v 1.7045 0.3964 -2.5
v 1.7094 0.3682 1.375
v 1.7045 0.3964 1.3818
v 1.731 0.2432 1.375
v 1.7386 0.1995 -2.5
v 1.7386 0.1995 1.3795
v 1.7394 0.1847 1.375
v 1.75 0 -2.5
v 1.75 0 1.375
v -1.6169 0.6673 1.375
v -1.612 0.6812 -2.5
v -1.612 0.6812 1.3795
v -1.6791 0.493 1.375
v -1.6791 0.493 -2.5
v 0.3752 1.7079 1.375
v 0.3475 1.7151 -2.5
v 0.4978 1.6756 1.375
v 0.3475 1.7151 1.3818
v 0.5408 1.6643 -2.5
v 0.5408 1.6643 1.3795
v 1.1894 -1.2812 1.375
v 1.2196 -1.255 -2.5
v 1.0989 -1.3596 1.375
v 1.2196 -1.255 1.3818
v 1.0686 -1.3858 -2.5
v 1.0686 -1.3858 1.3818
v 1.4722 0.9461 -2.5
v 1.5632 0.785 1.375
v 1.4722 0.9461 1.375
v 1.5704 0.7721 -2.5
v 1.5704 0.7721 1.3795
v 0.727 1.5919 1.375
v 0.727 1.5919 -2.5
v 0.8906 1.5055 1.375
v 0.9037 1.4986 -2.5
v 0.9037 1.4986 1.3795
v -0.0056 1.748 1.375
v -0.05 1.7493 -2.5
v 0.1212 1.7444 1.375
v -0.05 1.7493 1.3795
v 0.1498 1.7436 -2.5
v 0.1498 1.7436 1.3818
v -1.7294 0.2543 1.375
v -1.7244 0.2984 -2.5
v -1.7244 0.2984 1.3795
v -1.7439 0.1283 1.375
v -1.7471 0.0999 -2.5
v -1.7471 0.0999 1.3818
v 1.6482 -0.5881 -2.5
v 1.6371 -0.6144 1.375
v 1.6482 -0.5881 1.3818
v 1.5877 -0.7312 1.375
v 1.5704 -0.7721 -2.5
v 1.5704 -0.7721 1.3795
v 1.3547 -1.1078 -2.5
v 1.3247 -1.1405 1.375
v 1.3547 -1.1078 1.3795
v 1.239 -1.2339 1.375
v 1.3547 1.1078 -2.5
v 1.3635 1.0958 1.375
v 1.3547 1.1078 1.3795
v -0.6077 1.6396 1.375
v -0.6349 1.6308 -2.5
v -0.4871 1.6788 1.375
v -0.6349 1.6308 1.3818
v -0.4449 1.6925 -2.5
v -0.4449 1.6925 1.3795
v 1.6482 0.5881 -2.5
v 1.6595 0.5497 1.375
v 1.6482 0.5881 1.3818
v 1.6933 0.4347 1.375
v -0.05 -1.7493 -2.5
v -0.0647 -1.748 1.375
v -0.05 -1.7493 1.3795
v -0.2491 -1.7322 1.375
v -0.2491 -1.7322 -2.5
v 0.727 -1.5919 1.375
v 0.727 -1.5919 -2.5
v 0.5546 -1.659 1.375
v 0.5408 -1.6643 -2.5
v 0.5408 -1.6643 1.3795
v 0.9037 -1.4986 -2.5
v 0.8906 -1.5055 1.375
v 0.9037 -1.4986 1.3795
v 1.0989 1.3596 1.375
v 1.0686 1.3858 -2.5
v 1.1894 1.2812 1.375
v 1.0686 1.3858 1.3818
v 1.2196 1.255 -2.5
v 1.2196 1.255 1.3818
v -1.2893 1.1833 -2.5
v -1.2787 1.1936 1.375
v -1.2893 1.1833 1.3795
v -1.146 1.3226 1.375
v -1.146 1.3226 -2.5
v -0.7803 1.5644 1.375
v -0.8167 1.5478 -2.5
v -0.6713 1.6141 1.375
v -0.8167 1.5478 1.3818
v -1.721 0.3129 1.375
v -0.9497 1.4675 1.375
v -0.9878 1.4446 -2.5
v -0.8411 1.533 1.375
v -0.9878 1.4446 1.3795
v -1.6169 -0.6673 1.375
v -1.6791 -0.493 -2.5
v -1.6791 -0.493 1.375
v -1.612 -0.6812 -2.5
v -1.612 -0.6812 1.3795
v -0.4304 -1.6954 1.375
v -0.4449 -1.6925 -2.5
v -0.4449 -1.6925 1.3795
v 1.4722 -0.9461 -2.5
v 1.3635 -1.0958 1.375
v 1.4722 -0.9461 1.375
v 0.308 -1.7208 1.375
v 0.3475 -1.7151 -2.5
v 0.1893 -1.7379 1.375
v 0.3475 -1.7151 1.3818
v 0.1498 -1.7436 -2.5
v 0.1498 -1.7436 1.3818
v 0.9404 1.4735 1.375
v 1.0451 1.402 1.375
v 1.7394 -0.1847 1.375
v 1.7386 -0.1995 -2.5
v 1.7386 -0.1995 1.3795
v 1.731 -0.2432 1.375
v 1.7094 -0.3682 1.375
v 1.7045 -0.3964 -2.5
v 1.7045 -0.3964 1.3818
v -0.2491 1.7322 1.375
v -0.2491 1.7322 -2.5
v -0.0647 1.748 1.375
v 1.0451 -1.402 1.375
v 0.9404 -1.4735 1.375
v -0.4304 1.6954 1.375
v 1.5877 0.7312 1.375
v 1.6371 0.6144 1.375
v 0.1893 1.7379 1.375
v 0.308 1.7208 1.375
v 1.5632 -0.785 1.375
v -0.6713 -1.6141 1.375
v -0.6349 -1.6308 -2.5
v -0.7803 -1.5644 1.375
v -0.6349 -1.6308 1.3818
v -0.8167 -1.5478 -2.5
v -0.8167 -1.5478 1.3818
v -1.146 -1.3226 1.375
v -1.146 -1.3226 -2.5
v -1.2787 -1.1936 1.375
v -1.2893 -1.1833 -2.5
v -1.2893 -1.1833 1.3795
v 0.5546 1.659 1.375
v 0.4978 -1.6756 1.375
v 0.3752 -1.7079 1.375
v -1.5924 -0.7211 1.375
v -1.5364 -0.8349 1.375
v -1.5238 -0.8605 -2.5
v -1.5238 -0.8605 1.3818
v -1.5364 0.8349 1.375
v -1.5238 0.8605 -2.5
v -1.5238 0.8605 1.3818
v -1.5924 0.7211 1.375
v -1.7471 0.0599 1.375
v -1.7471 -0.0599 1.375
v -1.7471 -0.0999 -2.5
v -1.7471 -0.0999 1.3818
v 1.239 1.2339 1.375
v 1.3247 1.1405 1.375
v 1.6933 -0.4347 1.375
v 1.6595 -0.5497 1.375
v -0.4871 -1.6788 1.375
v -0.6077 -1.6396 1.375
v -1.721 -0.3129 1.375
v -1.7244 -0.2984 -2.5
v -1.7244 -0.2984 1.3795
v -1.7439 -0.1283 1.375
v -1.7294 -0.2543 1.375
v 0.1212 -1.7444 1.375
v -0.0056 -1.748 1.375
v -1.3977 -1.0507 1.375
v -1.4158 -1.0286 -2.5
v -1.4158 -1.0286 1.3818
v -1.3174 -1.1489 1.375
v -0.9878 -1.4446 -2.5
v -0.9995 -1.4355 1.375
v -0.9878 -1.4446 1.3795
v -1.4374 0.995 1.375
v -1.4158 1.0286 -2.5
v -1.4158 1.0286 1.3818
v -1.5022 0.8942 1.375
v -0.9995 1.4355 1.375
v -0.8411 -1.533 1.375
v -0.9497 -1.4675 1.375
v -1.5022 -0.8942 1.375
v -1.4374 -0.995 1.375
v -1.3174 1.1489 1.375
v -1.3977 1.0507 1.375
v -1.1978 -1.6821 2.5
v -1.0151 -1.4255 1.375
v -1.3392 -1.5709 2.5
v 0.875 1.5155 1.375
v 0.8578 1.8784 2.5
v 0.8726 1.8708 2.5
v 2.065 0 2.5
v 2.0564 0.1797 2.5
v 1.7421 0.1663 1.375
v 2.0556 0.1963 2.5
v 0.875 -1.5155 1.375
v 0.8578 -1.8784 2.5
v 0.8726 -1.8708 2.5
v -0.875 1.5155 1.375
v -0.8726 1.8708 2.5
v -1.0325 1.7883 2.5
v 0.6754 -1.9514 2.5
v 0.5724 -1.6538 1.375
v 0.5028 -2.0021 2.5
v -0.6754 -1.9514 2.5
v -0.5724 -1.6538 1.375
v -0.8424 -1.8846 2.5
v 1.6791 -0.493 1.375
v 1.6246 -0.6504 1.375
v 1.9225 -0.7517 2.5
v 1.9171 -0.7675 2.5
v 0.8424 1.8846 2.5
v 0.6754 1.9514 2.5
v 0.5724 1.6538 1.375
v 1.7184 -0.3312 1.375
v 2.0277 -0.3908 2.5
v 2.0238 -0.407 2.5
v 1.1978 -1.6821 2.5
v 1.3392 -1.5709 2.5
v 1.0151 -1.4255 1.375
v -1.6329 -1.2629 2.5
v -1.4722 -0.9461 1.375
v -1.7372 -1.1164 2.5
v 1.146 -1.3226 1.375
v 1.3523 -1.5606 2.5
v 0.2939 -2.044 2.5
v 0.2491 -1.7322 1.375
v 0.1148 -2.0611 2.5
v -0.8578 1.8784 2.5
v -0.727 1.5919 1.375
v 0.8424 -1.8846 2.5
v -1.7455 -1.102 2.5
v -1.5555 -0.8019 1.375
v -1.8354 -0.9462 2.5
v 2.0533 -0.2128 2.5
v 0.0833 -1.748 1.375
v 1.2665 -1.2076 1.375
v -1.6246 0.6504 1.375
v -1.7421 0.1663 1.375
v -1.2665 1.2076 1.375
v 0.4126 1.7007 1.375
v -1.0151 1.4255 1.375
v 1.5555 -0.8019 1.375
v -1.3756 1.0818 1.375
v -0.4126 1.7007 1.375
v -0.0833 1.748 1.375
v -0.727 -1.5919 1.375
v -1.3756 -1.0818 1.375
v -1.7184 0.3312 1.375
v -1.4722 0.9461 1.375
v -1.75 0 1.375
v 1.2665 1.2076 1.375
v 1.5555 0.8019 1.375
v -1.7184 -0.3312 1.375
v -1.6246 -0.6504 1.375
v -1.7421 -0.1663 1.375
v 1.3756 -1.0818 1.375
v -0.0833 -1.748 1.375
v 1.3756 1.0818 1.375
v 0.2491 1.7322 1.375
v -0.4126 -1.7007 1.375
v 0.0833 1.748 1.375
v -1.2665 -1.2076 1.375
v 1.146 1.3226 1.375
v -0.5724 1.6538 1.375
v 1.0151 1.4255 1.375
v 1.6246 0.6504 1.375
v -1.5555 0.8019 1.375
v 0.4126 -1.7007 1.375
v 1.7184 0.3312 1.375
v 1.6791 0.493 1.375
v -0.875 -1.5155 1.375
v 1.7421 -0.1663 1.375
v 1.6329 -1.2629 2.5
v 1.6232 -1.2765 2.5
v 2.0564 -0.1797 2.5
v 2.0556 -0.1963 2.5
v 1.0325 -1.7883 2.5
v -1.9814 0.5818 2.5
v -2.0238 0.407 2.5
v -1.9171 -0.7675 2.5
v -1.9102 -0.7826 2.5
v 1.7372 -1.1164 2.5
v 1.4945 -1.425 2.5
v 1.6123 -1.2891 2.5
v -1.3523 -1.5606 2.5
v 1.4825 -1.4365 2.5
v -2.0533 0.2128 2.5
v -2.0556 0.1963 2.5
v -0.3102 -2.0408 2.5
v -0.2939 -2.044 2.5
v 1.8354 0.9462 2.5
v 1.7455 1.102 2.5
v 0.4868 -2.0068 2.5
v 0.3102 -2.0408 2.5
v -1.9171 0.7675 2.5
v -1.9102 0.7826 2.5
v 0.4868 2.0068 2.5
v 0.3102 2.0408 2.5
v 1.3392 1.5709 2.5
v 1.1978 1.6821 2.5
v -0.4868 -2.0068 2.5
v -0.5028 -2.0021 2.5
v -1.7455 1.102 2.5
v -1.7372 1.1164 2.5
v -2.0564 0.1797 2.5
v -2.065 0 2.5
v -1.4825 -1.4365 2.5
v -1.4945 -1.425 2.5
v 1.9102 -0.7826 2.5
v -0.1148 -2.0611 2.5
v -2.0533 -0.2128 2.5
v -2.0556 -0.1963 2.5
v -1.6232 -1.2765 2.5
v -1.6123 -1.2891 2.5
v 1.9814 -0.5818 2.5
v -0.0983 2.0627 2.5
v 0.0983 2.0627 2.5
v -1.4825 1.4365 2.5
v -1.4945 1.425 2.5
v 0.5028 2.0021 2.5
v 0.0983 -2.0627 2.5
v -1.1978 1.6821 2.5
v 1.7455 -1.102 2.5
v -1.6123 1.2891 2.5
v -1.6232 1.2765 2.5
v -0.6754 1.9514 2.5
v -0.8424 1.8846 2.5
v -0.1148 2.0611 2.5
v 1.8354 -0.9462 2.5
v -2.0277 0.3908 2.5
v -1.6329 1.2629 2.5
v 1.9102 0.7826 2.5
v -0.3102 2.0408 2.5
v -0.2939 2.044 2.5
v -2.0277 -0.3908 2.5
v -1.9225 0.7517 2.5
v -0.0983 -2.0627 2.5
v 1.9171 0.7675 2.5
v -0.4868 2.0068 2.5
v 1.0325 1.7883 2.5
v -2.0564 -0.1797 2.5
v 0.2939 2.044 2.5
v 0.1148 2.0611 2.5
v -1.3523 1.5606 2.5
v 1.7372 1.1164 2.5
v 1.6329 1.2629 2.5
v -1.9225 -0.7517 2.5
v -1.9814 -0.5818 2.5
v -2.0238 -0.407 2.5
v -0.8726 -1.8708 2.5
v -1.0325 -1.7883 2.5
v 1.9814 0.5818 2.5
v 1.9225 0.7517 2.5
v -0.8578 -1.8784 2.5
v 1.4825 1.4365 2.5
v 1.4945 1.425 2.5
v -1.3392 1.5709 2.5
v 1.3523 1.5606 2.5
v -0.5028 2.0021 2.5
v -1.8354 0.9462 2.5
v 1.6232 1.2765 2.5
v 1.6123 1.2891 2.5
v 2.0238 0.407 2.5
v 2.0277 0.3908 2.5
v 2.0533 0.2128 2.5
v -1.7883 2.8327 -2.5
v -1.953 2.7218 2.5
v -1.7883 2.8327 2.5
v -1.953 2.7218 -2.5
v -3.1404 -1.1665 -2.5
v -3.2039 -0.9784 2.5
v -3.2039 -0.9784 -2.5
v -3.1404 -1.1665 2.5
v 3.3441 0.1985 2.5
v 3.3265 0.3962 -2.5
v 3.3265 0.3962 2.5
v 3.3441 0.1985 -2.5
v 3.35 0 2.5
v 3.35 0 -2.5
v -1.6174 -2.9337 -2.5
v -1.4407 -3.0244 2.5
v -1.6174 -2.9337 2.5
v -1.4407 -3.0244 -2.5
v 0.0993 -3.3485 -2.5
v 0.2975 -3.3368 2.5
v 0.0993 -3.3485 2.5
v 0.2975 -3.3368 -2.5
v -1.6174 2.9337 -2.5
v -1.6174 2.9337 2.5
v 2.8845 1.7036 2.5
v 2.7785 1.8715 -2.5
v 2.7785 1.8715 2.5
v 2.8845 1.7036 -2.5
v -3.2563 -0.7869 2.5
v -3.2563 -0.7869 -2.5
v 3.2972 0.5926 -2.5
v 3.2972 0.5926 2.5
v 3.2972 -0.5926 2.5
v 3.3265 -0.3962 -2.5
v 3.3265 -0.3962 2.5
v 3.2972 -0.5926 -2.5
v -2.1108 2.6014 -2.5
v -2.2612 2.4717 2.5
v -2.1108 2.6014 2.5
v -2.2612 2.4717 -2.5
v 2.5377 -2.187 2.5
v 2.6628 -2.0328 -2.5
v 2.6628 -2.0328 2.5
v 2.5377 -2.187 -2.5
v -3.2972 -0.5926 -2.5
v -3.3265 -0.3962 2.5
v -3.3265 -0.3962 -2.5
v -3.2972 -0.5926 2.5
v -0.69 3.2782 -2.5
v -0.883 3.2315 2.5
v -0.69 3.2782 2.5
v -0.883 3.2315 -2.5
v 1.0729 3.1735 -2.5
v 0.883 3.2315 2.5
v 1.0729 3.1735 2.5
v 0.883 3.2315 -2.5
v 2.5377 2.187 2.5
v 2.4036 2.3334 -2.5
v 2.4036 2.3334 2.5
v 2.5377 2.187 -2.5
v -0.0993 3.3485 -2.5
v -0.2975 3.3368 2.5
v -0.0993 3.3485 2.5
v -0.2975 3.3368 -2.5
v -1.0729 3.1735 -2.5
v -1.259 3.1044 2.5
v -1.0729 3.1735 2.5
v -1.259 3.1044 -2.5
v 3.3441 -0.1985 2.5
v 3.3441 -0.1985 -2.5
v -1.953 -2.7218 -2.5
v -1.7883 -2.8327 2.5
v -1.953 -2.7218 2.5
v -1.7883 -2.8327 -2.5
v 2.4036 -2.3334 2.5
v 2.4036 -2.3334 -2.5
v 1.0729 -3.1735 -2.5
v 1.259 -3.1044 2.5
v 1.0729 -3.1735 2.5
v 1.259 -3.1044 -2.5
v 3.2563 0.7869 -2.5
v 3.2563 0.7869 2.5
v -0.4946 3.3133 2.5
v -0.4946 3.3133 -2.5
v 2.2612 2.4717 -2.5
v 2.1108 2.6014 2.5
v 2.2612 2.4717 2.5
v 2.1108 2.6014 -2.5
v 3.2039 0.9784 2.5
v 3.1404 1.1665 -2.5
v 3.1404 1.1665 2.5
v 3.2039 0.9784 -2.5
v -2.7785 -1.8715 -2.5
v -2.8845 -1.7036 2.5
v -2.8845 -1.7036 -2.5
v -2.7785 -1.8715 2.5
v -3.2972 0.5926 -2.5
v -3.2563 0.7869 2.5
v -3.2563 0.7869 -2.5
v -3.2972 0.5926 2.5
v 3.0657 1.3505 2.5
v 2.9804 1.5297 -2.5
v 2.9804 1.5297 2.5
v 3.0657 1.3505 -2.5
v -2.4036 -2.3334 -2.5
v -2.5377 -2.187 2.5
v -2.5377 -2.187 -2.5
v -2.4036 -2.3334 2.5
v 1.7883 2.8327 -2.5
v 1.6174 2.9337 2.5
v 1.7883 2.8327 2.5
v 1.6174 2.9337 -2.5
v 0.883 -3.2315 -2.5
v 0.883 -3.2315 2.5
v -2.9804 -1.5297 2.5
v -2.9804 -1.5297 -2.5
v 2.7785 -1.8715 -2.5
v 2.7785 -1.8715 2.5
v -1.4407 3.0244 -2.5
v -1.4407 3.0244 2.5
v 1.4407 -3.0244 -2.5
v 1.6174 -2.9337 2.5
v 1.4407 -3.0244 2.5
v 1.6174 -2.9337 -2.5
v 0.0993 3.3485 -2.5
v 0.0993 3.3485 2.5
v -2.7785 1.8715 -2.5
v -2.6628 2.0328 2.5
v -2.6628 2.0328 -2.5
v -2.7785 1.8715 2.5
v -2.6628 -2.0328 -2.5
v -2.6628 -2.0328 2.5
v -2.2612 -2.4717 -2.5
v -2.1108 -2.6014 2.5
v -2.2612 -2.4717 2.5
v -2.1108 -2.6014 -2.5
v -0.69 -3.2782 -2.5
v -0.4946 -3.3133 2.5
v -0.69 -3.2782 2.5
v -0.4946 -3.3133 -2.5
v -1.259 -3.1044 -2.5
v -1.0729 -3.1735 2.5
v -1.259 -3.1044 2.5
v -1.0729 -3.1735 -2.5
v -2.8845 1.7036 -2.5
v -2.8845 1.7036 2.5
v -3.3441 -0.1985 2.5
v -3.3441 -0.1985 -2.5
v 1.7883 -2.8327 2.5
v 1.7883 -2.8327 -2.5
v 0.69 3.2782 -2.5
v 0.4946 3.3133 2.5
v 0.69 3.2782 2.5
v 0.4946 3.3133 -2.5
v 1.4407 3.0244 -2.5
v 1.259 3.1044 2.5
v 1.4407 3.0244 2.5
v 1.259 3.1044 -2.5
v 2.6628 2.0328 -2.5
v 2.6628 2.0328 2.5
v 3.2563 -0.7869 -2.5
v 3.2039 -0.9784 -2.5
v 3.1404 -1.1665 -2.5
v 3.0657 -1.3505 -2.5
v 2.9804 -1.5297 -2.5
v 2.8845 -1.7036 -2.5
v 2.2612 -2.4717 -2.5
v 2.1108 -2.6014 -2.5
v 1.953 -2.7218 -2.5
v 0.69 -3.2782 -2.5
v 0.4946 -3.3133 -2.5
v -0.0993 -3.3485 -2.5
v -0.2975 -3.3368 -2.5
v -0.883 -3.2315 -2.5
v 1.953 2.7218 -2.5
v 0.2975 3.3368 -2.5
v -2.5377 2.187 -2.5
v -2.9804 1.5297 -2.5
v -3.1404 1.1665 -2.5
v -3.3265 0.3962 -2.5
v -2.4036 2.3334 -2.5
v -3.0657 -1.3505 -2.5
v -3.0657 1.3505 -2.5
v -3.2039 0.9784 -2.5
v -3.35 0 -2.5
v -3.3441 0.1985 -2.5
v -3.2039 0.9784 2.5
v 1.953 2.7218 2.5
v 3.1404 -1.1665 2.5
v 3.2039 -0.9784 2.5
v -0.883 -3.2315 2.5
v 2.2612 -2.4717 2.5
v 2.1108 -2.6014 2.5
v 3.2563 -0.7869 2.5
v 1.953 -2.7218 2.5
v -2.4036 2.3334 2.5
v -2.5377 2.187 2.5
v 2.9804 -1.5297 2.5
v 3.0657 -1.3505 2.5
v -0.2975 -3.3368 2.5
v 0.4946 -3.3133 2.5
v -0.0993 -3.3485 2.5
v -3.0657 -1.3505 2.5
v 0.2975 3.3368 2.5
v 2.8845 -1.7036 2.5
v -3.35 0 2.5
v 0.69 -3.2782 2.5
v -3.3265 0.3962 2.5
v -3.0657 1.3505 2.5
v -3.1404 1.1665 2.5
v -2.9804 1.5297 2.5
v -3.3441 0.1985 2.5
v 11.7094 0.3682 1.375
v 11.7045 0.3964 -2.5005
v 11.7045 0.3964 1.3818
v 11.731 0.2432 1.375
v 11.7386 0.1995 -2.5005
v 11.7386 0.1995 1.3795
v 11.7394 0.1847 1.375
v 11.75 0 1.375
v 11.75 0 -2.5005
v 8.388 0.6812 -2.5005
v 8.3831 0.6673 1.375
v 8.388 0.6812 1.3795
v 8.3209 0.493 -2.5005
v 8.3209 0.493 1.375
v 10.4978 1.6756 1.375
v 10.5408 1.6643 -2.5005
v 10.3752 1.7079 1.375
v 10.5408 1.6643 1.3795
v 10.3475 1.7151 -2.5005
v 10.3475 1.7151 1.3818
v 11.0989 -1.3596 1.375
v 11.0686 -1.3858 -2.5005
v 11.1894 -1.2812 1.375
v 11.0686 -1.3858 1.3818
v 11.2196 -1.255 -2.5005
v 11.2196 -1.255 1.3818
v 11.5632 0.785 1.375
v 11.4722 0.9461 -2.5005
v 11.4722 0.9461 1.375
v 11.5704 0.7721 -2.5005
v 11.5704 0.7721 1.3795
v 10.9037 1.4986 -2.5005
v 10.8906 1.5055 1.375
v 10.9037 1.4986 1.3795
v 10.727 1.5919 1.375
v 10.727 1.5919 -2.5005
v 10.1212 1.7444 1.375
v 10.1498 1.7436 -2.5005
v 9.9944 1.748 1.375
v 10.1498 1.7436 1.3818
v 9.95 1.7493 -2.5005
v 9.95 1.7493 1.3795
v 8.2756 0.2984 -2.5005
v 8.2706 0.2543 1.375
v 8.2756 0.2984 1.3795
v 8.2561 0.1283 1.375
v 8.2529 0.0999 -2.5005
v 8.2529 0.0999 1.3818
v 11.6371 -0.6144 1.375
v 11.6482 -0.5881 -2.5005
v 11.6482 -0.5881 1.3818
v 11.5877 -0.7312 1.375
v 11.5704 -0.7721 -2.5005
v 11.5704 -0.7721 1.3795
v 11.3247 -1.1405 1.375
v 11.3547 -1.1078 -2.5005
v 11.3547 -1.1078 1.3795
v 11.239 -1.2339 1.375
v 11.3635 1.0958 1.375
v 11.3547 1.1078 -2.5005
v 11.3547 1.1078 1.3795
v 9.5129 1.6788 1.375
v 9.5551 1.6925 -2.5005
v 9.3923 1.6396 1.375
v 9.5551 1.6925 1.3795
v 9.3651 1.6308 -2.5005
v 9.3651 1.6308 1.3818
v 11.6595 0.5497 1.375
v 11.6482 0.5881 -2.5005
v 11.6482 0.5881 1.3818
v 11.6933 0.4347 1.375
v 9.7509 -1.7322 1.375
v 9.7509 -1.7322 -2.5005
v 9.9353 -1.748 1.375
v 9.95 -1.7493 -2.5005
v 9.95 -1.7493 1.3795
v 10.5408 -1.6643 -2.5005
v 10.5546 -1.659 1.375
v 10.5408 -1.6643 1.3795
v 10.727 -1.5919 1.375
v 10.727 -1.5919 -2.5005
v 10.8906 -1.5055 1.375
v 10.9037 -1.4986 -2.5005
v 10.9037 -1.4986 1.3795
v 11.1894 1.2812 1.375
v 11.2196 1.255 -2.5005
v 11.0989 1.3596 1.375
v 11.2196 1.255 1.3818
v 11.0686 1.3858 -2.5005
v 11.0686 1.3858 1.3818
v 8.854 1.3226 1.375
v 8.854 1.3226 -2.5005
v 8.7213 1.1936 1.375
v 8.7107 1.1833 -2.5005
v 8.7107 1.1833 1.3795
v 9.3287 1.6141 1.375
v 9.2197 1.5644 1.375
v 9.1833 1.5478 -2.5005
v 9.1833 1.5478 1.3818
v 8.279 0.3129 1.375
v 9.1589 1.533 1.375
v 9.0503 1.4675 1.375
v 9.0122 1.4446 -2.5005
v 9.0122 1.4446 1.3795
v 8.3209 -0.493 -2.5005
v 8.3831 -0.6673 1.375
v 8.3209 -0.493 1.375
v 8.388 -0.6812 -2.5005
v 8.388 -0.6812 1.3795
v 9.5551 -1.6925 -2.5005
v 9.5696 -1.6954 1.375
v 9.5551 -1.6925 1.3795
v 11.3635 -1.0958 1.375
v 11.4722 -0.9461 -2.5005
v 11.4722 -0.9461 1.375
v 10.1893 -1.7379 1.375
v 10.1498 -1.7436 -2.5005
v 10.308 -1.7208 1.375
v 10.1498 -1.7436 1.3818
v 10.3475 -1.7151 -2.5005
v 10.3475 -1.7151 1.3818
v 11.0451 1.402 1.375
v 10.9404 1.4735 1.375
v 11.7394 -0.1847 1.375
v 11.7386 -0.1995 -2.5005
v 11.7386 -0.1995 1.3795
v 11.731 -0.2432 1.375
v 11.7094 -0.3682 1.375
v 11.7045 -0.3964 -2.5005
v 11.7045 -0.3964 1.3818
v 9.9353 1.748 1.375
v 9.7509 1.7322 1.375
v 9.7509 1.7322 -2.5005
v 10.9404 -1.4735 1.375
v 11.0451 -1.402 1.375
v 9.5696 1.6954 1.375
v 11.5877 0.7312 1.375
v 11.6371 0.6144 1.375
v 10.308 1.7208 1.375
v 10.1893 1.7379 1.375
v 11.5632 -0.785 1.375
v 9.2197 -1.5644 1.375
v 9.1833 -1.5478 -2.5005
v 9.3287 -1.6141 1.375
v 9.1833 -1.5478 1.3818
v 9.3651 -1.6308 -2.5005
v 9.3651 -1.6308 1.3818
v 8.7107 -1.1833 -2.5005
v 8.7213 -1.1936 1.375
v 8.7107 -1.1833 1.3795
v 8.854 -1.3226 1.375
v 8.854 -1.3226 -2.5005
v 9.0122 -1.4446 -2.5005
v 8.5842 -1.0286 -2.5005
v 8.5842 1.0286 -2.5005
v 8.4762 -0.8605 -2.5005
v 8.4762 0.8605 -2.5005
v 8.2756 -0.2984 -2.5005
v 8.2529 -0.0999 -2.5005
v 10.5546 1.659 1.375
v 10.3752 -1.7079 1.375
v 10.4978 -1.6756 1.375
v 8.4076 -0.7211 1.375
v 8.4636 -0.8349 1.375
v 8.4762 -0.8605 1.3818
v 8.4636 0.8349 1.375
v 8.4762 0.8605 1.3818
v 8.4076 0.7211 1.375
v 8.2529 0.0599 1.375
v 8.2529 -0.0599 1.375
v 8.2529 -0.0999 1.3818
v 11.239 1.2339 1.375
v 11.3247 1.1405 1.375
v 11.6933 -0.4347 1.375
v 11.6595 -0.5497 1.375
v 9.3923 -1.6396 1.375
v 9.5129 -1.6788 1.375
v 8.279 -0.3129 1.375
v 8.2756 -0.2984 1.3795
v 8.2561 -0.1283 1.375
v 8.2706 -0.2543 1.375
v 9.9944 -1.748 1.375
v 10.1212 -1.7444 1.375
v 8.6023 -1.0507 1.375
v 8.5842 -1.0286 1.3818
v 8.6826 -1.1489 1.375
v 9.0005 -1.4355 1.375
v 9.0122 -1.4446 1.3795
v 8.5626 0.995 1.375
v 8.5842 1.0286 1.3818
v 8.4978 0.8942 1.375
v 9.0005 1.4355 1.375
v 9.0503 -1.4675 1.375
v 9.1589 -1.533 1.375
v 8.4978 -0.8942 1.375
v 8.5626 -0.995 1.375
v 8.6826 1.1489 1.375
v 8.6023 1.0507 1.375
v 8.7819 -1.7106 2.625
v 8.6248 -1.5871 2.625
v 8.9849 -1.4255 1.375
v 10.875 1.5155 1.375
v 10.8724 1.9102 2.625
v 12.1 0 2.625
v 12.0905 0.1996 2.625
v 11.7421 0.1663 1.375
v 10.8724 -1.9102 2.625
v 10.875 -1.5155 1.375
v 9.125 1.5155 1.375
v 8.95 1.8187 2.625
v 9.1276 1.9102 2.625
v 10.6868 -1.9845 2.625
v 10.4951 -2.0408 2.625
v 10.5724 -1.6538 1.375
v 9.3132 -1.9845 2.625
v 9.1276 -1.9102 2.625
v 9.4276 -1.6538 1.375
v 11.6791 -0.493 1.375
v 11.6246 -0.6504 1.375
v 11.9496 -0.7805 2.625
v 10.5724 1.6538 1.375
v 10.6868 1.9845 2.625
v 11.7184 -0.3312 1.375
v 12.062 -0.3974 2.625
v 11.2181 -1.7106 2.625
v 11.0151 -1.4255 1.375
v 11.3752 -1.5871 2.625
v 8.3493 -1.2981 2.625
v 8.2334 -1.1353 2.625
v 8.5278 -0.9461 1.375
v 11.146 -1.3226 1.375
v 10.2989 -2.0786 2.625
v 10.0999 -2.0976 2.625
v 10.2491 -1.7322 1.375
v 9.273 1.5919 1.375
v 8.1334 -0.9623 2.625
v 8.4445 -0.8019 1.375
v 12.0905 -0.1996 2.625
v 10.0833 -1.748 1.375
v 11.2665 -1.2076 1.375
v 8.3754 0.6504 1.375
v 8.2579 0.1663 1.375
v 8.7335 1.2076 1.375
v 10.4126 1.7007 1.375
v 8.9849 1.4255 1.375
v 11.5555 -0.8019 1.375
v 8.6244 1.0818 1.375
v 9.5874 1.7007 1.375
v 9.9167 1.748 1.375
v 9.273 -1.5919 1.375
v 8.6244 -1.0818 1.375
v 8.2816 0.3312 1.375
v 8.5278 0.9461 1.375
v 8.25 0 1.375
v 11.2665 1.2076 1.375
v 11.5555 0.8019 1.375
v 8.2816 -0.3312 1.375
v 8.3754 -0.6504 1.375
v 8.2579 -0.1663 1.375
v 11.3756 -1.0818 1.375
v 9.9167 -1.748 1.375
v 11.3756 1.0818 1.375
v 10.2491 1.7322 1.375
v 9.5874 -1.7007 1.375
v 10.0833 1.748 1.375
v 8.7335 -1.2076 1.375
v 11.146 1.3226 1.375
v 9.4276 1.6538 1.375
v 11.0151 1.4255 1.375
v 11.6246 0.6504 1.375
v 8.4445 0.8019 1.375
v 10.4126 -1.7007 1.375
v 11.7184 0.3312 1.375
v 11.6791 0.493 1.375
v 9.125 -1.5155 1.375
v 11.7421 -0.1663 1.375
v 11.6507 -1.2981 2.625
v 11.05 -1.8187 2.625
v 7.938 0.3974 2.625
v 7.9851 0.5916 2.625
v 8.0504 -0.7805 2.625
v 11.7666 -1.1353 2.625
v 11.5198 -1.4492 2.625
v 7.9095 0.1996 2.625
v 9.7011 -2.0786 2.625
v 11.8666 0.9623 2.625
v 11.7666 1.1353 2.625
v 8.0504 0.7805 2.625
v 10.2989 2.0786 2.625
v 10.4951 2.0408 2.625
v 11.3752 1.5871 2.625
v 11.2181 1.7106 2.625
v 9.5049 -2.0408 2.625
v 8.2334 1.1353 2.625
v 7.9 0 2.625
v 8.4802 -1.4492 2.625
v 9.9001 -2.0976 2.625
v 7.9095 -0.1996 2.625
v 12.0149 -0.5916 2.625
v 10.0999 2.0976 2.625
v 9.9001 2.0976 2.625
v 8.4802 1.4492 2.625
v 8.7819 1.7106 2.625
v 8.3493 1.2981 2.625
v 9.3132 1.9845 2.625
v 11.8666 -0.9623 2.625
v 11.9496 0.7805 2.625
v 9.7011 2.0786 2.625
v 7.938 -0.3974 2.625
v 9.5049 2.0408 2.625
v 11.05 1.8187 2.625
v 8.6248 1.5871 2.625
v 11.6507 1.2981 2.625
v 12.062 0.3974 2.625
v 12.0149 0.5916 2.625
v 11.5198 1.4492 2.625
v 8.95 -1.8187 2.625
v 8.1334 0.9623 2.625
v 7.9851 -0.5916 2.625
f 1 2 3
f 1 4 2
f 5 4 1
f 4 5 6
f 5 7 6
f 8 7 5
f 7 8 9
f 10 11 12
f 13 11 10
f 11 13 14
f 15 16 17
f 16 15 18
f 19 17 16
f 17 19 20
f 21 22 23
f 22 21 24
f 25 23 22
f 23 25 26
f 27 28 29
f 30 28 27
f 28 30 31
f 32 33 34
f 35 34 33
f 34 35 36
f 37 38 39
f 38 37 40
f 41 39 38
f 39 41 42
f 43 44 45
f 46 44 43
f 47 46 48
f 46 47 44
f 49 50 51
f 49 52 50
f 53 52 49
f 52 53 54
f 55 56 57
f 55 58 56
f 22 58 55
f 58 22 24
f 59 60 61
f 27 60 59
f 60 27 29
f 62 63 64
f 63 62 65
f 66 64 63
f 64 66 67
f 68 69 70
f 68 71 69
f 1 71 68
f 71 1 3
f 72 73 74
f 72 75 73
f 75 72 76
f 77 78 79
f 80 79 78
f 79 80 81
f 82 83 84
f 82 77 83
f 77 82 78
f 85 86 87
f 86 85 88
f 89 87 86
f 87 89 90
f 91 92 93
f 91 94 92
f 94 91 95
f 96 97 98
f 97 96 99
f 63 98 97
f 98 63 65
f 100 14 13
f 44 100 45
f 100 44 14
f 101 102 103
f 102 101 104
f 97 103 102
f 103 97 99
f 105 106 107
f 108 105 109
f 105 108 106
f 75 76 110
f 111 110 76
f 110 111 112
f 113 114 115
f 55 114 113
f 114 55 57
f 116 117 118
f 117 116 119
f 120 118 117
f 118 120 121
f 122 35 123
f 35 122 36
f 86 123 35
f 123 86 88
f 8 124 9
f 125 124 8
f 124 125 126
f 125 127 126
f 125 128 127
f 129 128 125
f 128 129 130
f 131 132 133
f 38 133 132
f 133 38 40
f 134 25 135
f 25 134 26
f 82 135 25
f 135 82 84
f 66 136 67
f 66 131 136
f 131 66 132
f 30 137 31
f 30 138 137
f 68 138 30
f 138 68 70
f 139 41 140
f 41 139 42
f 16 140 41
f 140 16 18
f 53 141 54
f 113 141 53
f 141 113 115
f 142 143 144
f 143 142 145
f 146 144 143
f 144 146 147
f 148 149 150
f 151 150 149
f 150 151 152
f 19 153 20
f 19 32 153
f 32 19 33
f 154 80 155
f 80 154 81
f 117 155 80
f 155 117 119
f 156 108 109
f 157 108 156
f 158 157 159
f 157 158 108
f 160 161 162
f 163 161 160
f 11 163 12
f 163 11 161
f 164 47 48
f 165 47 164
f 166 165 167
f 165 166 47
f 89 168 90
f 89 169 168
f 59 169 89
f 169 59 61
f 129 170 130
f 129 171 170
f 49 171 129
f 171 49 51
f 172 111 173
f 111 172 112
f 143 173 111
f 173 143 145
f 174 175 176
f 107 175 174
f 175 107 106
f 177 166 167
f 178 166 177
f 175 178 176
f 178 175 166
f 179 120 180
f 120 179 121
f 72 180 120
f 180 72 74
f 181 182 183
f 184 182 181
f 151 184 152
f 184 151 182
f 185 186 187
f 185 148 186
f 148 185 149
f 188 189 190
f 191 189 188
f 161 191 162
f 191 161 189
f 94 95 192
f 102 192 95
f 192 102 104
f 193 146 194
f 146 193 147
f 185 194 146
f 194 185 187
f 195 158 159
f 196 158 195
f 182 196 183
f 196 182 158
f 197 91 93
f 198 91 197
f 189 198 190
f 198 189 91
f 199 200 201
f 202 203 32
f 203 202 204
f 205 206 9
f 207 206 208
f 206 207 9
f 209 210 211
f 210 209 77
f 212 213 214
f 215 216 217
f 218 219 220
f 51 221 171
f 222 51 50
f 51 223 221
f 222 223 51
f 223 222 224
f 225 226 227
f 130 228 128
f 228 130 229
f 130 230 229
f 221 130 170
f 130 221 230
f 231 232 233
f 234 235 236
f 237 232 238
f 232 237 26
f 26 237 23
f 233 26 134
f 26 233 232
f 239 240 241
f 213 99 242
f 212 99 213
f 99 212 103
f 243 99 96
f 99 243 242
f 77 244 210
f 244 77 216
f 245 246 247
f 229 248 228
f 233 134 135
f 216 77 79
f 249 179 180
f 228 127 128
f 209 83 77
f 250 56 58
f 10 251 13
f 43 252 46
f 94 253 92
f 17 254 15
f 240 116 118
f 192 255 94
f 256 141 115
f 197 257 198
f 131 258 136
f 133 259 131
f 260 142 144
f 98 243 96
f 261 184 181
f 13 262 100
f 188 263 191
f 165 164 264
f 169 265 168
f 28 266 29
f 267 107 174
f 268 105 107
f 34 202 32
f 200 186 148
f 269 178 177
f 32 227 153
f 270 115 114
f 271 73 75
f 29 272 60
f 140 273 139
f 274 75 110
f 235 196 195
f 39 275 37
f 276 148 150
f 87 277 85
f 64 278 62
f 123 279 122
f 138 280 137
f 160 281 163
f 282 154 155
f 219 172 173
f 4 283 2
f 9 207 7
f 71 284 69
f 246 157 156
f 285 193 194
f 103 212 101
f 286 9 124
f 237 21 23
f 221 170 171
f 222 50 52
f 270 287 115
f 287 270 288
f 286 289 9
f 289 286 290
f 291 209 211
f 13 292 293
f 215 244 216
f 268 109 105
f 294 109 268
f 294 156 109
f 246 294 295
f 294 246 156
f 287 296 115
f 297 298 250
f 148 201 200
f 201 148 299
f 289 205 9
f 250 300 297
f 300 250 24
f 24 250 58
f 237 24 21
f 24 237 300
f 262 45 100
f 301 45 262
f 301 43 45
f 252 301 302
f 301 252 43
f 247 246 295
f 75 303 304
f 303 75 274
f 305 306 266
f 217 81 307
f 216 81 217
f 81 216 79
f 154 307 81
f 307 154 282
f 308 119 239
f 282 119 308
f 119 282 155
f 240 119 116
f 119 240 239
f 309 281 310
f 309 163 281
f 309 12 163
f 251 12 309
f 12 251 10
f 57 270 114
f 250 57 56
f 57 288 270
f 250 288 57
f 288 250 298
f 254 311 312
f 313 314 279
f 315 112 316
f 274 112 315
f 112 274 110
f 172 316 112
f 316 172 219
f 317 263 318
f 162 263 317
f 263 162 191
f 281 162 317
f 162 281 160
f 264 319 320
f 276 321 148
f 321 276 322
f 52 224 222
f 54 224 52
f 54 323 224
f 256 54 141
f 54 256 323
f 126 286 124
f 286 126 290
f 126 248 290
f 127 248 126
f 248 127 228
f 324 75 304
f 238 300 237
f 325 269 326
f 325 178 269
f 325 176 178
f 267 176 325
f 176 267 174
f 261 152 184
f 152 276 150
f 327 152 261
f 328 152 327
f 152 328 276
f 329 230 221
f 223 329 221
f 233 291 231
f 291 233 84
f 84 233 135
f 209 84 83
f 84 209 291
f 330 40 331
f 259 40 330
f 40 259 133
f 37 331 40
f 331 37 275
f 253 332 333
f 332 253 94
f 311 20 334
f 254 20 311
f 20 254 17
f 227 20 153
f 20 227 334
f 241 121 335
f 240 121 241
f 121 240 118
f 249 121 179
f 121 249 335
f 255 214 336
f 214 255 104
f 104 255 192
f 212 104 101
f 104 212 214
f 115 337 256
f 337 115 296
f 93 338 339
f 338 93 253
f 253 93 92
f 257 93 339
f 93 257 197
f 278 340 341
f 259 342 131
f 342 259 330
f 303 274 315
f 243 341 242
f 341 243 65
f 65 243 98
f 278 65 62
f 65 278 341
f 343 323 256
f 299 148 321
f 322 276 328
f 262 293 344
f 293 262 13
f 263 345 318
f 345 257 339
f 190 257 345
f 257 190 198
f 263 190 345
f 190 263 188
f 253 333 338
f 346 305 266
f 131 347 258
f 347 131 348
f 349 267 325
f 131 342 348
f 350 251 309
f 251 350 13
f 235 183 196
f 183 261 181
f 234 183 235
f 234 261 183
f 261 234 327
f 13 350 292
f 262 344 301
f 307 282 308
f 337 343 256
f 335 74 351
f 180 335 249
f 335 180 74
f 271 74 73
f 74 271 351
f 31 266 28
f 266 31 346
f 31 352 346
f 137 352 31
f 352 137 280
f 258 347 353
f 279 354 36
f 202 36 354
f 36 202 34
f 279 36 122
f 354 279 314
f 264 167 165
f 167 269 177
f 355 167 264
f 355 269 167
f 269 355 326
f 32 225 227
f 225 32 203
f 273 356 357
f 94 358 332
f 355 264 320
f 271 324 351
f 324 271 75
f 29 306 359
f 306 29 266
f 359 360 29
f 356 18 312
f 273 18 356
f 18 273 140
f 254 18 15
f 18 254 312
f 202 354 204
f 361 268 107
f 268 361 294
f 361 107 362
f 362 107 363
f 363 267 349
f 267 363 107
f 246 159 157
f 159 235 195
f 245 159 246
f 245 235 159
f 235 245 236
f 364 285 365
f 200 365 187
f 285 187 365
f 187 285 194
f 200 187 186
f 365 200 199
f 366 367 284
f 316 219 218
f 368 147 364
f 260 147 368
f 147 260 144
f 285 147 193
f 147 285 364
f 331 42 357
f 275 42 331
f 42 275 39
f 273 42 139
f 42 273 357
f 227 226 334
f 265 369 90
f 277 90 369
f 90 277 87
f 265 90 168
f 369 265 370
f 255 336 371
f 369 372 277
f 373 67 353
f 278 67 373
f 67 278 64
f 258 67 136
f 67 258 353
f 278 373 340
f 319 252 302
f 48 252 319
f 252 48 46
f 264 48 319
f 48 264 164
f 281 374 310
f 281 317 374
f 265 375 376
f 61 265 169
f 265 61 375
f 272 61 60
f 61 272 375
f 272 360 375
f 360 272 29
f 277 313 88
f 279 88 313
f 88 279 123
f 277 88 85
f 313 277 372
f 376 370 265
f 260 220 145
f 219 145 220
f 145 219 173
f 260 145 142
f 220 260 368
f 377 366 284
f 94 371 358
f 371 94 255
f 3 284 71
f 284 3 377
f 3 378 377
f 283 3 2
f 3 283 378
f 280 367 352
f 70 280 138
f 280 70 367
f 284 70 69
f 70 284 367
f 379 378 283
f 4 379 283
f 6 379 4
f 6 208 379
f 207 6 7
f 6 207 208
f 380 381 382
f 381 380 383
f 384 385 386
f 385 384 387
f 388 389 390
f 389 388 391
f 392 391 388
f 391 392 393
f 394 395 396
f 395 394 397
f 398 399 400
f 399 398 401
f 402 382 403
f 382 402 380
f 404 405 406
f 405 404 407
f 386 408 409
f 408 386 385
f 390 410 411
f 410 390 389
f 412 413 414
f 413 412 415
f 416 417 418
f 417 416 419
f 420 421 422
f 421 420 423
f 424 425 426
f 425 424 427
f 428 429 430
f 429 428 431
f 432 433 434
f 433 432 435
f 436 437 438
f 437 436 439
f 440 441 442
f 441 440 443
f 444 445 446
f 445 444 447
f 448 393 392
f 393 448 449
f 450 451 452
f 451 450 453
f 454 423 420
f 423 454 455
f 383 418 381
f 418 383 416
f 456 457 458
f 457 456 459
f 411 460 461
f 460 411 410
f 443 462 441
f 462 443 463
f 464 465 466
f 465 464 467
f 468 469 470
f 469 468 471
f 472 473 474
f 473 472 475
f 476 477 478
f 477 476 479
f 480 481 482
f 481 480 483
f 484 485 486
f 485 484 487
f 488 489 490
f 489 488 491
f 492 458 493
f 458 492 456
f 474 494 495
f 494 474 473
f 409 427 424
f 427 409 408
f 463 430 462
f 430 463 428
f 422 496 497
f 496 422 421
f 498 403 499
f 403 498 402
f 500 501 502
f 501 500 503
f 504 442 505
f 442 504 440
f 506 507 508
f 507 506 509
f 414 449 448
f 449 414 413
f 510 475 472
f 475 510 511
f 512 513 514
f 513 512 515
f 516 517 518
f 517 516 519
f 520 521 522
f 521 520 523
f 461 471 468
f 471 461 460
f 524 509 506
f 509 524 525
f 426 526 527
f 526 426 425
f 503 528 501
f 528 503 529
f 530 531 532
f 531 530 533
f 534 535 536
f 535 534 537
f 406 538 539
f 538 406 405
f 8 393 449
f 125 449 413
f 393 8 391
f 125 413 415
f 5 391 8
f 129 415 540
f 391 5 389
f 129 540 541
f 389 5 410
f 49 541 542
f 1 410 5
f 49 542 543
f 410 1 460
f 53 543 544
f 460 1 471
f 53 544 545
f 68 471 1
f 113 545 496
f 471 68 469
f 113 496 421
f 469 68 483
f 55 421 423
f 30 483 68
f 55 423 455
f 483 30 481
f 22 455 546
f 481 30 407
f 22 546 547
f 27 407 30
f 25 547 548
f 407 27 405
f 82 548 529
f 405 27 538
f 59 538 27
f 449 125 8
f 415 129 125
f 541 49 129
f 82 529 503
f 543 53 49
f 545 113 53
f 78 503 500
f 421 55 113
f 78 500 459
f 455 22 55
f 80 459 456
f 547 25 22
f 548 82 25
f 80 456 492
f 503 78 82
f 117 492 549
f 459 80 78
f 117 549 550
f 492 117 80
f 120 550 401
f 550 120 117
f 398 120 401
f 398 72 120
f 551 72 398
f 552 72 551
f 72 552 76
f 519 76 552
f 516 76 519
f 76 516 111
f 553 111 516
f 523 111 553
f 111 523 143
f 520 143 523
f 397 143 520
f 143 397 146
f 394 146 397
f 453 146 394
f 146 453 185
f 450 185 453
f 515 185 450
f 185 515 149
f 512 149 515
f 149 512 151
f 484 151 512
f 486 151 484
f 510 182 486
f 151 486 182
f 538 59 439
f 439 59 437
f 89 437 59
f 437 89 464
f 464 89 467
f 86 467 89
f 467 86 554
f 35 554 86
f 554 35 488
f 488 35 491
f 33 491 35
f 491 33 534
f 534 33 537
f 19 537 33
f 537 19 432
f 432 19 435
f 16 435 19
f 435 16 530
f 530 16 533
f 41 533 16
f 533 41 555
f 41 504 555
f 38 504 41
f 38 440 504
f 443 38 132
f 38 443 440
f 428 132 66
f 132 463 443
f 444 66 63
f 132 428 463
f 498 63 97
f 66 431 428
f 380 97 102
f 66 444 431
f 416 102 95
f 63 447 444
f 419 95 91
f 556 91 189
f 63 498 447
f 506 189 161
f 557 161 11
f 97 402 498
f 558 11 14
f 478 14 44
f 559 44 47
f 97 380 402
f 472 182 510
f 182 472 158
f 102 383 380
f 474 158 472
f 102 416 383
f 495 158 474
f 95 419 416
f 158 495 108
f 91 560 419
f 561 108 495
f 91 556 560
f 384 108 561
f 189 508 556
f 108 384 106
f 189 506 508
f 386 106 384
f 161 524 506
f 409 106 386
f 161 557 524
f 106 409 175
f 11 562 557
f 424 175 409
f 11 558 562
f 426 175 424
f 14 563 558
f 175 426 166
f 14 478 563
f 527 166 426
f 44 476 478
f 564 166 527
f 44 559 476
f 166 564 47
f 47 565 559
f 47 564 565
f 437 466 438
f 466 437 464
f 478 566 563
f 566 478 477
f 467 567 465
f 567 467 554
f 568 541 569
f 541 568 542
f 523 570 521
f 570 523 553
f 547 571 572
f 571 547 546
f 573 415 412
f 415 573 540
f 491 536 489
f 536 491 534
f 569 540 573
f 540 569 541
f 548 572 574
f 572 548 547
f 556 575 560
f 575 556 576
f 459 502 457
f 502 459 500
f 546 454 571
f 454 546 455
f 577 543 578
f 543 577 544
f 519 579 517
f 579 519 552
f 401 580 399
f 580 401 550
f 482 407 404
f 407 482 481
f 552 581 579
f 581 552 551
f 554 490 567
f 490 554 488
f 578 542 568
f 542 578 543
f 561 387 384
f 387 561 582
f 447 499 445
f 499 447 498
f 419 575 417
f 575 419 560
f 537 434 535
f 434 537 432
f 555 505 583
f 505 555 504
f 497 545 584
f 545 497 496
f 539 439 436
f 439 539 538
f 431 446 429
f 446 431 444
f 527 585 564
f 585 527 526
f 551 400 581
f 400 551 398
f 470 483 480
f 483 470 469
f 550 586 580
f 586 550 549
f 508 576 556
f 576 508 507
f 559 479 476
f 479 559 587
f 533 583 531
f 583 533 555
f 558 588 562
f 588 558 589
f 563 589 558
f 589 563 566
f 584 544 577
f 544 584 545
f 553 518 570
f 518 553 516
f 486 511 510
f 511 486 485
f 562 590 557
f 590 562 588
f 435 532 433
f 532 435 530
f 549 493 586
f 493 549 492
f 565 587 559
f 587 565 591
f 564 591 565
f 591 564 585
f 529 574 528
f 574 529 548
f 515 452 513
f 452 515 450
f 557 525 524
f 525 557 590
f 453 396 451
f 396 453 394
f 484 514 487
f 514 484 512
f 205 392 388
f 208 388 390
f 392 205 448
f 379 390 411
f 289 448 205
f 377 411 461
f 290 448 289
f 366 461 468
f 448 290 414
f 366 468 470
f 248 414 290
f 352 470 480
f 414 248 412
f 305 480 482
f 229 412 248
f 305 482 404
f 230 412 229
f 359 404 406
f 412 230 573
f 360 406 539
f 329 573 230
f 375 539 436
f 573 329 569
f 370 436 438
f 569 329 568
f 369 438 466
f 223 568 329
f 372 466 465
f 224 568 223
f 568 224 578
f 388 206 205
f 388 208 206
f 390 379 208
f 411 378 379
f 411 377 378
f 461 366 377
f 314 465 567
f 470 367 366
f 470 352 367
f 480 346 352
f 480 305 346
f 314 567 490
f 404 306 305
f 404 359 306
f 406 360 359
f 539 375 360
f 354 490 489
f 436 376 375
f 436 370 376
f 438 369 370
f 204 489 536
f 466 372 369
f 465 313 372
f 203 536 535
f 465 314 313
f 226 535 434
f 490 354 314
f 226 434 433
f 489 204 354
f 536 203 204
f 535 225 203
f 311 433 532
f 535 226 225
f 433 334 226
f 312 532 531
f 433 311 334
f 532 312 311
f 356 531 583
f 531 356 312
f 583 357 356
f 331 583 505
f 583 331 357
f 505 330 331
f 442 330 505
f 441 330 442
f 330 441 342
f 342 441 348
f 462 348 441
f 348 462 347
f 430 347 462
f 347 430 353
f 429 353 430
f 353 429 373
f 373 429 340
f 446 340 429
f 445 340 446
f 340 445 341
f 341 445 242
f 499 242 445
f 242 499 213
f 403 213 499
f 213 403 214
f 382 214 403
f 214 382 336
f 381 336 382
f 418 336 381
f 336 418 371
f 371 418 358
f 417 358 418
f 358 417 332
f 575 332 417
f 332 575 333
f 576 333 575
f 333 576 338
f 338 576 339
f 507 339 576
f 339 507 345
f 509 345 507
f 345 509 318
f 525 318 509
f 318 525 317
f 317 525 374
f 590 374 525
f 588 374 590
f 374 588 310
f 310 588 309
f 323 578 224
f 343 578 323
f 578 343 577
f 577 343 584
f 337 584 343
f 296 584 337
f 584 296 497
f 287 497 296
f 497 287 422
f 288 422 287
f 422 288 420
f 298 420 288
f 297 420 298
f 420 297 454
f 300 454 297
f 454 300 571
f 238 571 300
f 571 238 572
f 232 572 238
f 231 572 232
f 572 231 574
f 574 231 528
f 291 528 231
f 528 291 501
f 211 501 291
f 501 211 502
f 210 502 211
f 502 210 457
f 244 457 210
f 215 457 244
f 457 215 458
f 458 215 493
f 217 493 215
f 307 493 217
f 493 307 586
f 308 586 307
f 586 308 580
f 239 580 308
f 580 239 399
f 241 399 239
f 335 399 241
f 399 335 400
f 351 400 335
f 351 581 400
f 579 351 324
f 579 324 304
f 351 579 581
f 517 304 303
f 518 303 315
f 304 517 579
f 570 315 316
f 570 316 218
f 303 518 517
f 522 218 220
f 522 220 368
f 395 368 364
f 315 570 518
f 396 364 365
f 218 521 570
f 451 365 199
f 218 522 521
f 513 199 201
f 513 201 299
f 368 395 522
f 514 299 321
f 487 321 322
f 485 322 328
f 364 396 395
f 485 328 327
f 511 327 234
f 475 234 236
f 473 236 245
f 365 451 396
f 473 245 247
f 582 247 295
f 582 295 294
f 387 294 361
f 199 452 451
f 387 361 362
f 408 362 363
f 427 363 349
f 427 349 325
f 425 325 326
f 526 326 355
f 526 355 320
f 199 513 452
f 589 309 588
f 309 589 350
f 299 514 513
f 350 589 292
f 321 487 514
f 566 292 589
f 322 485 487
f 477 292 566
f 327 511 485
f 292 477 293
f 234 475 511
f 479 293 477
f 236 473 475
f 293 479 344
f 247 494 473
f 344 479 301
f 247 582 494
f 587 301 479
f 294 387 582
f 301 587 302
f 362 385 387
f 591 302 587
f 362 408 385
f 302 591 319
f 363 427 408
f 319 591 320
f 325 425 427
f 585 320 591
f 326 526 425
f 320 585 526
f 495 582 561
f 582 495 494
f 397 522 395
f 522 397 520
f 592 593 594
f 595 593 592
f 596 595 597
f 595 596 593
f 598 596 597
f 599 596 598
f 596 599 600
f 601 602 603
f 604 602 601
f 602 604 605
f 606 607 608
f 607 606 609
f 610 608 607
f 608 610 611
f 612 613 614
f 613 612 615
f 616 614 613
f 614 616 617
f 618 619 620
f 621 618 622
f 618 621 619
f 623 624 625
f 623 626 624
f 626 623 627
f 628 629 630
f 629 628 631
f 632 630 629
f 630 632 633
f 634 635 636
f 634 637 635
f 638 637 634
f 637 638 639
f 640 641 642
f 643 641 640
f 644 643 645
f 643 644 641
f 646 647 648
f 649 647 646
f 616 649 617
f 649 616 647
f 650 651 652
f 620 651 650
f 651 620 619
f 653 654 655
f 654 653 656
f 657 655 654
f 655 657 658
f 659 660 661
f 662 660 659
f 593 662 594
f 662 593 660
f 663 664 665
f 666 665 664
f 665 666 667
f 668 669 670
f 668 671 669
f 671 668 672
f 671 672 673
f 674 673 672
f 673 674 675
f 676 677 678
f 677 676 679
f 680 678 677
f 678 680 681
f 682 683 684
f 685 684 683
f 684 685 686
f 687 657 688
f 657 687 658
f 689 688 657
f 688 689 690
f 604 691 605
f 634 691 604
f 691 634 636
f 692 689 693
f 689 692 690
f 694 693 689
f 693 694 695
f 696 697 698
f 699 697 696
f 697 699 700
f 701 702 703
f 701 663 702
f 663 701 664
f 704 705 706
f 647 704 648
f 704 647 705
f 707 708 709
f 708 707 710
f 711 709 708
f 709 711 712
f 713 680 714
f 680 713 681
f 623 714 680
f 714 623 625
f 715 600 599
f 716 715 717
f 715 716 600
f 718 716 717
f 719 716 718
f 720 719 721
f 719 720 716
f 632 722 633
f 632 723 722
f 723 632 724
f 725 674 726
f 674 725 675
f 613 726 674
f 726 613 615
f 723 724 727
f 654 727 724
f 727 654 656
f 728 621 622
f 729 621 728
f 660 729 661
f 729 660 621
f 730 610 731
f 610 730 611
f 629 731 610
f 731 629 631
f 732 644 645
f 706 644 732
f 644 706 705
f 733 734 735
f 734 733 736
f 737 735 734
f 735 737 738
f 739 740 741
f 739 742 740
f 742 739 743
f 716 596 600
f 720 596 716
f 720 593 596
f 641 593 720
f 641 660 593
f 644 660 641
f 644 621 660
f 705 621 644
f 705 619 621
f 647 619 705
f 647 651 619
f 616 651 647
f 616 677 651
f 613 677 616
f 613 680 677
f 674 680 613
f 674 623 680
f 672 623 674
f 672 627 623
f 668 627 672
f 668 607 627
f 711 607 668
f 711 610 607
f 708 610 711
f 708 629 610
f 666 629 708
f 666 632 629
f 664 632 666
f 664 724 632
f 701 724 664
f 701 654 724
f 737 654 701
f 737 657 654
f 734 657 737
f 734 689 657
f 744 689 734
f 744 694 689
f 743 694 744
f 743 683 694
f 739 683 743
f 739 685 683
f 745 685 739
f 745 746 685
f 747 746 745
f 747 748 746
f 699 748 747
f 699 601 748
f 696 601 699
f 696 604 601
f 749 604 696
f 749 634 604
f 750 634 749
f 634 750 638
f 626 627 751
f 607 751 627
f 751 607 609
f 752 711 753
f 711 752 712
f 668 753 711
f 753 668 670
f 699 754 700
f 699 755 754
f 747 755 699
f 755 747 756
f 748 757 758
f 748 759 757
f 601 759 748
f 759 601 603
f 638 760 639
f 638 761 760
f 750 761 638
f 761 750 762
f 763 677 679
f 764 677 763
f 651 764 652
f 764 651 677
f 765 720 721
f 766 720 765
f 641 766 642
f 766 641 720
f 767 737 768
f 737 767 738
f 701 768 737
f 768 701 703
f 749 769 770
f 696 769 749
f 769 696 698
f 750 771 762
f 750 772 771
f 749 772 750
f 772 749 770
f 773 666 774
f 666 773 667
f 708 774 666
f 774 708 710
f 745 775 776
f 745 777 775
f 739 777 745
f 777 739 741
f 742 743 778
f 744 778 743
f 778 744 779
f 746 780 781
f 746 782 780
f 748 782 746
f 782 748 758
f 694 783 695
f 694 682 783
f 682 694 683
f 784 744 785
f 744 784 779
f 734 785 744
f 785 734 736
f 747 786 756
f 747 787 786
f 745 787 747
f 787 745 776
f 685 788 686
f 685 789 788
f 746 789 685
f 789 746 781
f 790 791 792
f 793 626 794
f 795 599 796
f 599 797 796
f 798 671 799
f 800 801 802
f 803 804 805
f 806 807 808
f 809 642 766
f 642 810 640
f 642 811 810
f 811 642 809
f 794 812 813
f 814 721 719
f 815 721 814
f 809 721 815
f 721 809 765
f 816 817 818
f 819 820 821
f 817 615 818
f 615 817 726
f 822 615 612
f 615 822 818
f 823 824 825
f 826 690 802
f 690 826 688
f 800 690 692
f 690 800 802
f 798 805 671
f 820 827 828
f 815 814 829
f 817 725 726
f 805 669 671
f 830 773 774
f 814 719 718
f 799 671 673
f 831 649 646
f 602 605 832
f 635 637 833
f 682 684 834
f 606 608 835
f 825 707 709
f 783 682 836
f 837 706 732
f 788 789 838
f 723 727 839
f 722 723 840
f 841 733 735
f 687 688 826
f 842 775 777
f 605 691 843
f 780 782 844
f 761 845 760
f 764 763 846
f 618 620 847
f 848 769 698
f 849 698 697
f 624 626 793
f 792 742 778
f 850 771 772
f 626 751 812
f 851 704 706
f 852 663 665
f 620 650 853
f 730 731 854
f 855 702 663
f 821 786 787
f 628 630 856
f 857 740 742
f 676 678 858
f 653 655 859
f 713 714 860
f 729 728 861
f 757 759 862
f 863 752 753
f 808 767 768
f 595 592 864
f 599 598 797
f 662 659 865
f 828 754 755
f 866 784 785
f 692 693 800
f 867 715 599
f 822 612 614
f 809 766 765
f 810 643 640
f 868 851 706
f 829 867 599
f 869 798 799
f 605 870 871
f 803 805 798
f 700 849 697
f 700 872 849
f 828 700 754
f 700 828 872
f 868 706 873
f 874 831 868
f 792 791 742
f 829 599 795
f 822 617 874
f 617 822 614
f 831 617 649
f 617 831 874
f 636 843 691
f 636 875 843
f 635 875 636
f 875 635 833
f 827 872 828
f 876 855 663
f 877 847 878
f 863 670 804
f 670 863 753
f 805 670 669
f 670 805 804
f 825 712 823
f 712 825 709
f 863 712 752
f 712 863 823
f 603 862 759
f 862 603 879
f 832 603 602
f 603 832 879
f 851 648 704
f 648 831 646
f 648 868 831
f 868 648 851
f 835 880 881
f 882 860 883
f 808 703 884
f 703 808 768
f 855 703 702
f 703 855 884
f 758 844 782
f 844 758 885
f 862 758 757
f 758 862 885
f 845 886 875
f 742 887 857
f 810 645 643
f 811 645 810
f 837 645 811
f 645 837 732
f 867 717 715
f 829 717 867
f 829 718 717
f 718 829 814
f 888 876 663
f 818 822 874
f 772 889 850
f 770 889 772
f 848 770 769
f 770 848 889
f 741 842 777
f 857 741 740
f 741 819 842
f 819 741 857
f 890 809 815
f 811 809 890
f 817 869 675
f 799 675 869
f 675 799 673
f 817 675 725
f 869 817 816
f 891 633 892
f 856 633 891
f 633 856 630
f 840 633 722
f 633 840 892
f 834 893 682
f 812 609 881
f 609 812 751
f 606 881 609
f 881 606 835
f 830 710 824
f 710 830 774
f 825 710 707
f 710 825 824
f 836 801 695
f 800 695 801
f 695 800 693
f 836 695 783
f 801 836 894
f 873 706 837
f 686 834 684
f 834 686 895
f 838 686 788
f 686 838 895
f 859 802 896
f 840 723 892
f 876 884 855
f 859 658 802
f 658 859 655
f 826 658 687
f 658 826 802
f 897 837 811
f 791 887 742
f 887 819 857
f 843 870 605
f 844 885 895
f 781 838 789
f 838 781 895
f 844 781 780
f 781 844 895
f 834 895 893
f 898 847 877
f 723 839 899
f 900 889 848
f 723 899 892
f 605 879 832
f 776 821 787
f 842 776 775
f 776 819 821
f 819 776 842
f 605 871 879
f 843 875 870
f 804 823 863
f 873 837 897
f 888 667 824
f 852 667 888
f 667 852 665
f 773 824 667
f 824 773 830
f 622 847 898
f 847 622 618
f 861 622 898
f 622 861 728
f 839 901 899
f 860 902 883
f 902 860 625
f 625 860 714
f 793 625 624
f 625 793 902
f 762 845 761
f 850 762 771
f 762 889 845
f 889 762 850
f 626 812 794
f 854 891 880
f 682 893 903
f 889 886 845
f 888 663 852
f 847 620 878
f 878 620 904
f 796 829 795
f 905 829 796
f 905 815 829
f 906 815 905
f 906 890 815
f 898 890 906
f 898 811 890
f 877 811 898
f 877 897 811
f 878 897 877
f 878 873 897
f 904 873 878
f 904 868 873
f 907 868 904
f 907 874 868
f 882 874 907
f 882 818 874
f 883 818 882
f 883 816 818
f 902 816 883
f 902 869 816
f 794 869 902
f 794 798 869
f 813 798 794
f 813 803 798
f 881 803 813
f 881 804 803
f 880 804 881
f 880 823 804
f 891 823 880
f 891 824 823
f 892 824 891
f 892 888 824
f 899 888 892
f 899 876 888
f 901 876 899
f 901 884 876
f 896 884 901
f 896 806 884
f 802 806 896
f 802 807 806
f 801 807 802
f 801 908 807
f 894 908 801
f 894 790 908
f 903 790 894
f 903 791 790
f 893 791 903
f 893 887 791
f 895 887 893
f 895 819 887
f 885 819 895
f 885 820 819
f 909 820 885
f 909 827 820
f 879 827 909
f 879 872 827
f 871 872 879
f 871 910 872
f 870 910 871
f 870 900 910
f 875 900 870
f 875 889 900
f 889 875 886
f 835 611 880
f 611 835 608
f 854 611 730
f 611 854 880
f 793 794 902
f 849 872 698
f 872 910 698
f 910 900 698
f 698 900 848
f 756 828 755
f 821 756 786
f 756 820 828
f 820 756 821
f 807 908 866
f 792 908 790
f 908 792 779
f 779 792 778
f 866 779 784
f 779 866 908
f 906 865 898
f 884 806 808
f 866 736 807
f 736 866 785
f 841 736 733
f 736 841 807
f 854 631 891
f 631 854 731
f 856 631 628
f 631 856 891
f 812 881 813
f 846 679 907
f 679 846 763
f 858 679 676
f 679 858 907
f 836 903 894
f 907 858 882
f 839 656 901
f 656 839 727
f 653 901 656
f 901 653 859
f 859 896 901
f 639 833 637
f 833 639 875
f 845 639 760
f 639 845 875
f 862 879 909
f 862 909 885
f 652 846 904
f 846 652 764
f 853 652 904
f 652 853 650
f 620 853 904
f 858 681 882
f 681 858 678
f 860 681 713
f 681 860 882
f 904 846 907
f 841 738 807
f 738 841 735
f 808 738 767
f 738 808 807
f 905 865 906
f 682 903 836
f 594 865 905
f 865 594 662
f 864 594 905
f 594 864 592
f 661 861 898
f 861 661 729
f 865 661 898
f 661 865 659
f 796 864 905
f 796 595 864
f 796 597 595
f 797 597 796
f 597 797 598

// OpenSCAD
//Module to create a knurl pocket suitable for Heat-set inserts
//Global vars
$fa = 1;
$fs = 0.2;
knurl_radius = 1.75;
knurl_wall = 1.6;


module m2knurl_ring(knurl_depth = 5)
{

    difference() {   
        cylinder(h=knurl_depth, r=knurl_radius+knurl_wall,center=true);
        m2knurl_pocket(knurl_depth = 5);
    }
    
}

module m2knurl_pocket(knurl_depth = 5)
{
 union() {
    cylinder(h=knurl_depth+0.001, r=knurl_radius, center=true);
    translate([0,0,0.4*knurl_depth])
        cylinder(h=0.25 * knurl_depth, r1=knurl_radius, r2=1.2*knurl_radius, center=true);
 }
}

m2knurl_ring();
translate([10,0,0]) m2knurl_pocket();
